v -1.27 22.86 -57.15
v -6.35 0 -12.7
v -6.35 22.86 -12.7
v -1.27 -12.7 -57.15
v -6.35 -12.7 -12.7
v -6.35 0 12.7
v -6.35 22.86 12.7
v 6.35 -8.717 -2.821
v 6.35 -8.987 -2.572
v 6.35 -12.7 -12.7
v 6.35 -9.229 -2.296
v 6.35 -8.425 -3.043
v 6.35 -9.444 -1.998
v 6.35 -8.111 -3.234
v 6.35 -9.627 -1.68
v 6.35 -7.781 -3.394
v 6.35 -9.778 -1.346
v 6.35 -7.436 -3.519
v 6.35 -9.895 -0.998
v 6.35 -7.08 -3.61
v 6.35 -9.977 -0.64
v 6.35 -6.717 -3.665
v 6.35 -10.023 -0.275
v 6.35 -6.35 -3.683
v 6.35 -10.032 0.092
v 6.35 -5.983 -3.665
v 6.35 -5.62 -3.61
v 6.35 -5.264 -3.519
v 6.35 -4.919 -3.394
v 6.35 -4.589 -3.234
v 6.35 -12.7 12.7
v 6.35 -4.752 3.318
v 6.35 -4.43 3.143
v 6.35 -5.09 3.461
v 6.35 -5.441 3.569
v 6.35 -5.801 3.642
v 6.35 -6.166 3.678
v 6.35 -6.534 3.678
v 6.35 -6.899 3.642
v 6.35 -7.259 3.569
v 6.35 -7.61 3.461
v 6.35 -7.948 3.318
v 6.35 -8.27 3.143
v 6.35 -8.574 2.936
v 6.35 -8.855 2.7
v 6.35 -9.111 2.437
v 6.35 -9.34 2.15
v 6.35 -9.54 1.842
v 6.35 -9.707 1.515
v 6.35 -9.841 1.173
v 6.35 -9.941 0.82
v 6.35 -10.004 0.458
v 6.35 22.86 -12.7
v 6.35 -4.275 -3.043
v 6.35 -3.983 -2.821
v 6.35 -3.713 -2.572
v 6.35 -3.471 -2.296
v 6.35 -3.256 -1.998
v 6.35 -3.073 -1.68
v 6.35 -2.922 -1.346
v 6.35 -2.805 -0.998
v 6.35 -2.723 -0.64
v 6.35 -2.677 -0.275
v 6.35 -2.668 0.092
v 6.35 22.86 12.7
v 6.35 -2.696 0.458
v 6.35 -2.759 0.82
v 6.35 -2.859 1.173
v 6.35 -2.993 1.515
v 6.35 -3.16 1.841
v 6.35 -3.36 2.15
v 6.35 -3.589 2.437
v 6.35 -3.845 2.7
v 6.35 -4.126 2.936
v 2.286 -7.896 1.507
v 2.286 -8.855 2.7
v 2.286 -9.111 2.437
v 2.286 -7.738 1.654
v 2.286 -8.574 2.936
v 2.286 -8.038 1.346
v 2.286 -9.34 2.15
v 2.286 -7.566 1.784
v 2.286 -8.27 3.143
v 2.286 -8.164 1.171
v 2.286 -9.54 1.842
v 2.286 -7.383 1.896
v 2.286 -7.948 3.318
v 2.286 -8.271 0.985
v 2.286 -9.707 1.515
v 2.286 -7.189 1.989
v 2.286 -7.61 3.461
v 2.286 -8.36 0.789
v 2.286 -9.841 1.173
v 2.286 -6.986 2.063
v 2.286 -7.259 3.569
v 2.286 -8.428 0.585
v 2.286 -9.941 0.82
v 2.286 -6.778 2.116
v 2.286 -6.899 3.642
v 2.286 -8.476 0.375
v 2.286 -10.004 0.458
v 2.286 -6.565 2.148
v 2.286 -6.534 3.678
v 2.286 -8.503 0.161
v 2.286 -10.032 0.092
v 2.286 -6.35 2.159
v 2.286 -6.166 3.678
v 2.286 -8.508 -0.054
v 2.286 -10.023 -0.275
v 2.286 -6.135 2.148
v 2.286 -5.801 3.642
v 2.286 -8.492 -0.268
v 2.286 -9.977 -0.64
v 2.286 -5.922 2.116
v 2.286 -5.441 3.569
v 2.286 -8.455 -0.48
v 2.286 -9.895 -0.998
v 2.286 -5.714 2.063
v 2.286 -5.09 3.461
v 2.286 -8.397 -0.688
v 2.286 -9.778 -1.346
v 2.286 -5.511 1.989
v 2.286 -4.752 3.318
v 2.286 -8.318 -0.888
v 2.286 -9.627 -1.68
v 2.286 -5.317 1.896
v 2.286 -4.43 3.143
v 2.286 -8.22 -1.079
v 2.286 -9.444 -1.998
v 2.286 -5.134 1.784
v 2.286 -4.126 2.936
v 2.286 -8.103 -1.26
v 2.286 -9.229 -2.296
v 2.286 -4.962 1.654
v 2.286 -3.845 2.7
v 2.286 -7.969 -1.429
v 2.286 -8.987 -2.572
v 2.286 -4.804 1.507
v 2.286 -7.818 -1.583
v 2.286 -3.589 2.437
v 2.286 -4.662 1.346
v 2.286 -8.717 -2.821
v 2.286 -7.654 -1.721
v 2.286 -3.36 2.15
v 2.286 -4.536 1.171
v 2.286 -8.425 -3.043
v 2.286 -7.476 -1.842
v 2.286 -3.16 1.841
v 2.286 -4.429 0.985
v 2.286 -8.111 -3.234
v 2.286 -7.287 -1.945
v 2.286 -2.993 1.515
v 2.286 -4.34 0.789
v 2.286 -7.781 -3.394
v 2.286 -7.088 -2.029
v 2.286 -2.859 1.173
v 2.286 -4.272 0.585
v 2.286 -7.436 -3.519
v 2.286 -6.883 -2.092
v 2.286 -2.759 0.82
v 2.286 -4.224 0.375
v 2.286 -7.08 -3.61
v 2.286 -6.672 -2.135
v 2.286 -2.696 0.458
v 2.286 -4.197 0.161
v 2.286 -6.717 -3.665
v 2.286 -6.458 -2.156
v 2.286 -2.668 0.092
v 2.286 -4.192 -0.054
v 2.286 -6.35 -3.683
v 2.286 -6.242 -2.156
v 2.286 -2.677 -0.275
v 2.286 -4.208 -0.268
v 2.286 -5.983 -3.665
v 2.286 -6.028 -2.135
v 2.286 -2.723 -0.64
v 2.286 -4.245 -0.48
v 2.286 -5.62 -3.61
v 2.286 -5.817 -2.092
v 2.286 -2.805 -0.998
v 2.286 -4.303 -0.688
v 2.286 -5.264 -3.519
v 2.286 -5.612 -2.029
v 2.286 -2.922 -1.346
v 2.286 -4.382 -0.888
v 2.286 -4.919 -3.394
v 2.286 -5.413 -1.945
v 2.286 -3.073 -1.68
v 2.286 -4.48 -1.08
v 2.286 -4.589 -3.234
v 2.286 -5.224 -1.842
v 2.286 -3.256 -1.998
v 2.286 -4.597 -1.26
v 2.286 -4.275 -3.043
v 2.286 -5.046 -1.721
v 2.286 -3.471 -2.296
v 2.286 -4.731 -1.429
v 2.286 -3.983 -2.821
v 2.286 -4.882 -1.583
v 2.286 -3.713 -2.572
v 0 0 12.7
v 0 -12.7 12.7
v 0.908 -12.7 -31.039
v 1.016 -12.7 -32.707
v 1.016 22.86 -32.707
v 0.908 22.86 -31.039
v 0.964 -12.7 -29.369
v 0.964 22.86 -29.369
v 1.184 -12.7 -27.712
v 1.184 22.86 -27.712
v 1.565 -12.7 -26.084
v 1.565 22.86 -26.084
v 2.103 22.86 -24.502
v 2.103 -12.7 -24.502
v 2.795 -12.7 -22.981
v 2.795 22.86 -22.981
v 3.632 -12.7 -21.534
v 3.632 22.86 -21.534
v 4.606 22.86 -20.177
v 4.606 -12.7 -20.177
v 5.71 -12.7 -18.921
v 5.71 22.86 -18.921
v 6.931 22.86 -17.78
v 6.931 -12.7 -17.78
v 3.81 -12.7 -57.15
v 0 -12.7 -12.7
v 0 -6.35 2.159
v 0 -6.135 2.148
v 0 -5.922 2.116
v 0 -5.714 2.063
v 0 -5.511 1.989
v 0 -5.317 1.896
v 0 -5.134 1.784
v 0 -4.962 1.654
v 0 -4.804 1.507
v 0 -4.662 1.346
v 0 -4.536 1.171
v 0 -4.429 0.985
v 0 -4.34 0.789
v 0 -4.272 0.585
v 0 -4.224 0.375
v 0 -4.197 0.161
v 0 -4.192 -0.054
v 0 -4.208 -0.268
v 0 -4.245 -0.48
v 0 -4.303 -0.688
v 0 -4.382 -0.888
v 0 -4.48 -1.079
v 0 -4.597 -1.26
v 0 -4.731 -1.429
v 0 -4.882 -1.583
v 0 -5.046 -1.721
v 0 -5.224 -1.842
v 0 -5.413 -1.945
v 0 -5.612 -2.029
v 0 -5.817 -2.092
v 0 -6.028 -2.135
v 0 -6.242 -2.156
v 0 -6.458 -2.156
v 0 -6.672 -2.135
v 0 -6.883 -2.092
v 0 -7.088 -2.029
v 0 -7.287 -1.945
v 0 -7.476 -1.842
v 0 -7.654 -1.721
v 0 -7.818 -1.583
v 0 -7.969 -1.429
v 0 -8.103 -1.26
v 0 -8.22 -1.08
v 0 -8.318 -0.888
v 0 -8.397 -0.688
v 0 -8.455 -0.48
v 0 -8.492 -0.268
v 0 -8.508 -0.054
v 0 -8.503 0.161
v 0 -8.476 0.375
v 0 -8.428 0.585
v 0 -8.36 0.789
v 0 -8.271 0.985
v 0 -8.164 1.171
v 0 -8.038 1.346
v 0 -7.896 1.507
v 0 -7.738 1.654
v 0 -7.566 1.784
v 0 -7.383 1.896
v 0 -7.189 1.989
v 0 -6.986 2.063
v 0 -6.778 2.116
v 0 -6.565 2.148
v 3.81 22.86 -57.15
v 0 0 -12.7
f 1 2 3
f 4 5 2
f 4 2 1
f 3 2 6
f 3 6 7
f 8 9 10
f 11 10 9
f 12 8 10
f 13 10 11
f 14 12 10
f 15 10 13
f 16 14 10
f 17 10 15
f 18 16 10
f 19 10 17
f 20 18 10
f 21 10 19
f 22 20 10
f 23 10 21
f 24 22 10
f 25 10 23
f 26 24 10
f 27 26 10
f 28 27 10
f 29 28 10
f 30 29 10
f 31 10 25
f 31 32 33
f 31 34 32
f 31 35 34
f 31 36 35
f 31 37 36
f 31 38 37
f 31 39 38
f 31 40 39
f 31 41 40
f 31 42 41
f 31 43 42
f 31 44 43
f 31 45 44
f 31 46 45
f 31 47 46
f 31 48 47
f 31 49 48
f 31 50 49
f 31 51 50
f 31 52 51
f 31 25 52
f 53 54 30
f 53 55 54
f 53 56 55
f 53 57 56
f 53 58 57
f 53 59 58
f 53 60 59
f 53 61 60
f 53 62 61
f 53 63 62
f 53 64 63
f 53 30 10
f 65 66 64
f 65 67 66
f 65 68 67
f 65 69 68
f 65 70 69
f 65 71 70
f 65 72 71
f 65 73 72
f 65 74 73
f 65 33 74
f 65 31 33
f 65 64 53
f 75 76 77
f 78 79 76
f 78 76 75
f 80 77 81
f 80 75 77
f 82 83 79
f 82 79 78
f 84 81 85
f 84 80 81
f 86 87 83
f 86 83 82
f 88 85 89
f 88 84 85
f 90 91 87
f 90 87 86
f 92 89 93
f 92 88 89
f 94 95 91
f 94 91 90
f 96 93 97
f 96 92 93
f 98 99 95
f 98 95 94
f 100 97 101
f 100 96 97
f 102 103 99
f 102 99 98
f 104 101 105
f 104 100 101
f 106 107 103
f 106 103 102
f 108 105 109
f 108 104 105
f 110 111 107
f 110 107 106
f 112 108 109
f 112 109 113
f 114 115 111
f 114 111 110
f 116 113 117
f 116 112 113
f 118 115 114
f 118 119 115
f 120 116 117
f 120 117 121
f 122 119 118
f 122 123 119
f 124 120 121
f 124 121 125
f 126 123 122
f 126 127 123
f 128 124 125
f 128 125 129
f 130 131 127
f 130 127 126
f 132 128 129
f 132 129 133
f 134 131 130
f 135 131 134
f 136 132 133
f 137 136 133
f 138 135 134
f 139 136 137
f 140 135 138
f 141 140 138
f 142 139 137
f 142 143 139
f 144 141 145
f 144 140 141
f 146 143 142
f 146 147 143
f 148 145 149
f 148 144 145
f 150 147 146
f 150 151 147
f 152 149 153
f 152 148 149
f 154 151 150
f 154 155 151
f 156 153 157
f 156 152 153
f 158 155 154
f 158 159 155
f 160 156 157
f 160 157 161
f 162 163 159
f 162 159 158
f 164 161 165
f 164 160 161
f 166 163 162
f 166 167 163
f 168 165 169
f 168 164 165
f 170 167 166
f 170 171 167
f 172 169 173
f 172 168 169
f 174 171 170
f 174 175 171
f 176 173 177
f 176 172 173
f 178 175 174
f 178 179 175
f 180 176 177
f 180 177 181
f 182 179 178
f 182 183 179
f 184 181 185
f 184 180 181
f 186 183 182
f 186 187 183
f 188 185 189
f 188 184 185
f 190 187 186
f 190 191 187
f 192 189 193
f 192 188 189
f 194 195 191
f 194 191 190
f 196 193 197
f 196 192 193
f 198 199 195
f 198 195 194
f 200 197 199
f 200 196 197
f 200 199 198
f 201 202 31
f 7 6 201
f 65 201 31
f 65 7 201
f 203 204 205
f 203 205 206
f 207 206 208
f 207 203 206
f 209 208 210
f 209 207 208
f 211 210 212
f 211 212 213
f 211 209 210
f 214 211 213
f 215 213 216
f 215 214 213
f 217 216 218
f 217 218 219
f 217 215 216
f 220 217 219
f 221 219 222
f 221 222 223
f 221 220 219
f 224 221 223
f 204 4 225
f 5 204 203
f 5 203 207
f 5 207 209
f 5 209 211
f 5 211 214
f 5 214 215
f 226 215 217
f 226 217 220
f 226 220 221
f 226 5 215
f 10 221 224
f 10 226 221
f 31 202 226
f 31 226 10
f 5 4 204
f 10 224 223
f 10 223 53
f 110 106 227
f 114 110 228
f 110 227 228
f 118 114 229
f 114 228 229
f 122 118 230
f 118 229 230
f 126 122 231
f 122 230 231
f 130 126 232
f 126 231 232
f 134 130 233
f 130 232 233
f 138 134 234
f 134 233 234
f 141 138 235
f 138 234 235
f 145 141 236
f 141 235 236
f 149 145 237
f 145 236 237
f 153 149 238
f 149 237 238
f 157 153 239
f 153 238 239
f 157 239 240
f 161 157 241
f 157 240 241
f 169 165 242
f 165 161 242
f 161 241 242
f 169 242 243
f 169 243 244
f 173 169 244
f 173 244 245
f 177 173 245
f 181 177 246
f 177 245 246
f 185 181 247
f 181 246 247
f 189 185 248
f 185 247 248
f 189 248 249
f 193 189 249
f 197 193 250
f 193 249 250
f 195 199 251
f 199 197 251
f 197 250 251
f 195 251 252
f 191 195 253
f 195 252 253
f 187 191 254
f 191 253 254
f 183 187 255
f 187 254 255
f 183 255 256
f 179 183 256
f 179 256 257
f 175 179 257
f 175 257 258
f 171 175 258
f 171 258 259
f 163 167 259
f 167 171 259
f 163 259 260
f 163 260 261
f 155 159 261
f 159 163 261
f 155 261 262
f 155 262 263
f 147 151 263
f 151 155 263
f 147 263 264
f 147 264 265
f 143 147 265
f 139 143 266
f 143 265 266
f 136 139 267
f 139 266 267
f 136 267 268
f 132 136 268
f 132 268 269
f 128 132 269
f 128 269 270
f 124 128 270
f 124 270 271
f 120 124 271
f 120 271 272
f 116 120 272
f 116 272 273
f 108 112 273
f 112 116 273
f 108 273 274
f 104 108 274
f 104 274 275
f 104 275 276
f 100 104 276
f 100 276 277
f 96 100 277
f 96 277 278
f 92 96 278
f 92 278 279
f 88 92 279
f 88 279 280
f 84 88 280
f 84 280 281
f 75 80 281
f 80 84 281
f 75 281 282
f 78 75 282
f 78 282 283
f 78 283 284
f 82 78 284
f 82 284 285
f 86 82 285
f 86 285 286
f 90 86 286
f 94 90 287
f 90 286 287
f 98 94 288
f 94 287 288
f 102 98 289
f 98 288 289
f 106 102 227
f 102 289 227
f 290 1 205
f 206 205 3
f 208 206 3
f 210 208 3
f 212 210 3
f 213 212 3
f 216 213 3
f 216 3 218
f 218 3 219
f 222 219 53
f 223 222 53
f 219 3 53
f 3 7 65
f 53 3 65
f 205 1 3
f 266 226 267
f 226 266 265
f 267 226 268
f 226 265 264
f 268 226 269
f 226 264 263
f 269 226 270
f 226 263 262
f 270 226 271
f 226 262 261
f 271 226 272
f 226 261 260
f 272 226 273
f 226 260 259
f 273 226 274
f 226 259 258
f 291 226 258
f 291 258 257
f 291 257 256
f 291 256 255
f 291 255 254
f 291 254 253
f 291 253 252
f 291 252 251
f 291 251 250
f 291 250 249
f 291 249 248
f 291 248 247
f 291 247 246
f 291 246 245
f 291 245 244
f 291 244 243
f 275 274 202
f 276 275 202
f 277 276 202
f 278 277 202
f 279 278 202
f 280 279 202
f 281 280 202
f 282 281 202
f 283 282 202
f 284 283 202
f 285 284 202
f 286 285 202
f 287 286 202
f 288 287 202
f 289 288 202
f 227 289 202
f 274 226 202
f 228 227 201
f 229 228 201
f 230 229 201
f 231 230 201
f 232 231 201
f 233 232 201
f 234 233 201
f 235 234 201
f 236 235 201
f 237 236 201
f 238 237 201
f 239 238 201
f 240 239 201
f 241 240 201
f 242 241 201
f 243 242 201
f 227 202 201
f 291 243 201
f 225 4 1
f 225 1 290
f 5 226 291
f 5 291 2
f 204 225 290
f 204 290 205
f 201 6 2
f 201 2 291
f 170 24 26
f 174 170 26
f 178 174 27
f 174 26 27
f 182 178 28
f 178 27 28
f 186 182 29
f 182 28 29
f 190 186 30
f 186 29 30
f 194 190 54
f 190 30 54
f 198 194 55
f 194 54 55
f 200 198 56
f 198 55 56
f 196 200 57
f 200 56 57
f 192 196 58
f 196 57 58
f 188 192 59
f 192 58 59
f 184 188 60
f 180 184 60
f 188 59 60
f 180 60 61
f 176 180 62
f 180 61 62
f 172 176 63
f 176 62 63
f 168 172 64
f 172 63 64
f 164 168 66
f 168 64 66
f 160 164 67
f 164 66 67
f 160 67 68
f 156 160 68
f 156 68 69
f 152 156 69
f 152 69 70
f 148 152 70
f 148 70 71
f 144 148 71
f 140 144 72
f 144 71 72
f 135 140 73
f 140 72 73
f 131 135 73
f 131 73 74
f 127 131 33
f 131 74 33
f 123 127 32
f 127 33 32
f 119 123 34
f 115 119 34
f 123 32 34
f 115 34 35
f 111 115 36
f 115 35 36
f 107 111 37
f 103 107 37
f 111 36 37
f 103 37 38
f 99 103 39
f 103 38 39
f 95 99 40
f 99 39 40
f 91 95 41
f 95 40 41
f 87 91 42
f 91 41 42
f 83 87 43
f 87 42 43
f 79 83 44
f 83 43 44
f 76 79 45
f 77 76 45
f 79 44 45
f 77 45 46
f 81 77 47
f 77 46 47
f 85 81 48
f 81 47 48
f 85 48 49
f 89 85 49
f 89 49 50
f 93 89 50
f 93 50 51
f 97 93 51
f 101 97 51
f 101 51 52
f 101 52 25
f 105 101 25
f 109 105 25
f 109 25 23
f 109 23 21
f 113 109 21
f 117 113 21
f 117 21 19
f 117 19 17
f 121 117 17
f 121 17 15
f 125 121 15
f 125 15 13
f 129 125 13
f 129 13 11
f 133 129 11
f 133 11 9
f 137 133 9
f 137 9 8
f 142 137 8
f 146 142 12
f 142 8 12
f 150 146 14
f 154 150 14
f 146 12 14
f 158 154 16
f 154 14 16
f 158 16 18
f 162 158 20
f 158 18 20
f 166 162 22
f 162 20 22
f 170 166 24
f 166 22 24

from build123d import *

# Parameters (mm, degrees)
PROFILE_W               = 12.7
PROFILE_H               = 22.86
PROFILE_W_2             = 6.35
PROFILE_H_2             = 12.7
BOSS_EXTRUDE1_DEPTH     = 12.7
SCREWHOLE_R             = 2.159
CUT_EXTRUDE1_DEPTH      = 7.35
CUT_EXTRUDE1_DEPTH_BACK = 7.35
SKETCH3_R               = 3.683
SKETCH3_R_2             = 2.159
CUT_EXTRUDE2_DEPTH      = 4.064
BOSS_EXTRUDE2_DEPTH     = 35.56


with BuildPart() as part:
    # Profile → Boss-Extrude1 (new body, symmetric)
    with BuildSketch(Plane.XY):
        with Locations((0, 11.43)):
            Rectangle(PROFILE_W, PROFILE_H)
        with Locations((3.175, -6.35)):
            Rectangle(PROFILE_W_2, PROFILE_H_2)
    extrude(amount=BOSS_EXTRUDE1_DEPTH, both=True)

    # ScrewHole → Cut-Extrude1 (cut, two sides)
    with BuildSketch(Plane.ZY) as cut_extrude1_sk:
        with Locations((0, -6.35)):
            Circle(SCREWHOLE_R)
    extrude(amount=CUT_EXTRUDE1_DEPTH, mode=Mode.SUBTRACT)
    extrude(cut_extrude1_sk.sketch, amount=-CUT_EXTRUDE1_DEPTH_BACK, mode=Mode.SUBTRACT)

    # Sketch3 → Cut-Extrude2 (cut)
    with BuildSketch(Plane(origin=(6.35, 0, 0), x_dir=(0, 0, -1), z_dir=(1, 0, 0))):
        with Locations((0, -6.35)):
            Circle(SKETCH3_R)
        with Locations((0, -6.35)):
            Circle(SKETCH3_R_2, mode=Mode.SUBTRACT)
    extrude(amount=-CUT_EXTRUDE2_DEPTH, mode=Mode.SUBTRACT)

    # Sketch5 → Boss-Extrude2 (add)
    with BuildSketch(Plane.XZ.offset(12.7)):
        with BuildLine():
            Line((-1.27, -57.15), (3.81, -57.15))
            Line((3.81, -57.15), (1.016473553, -32.70664359))
            ThreePointArc((1.016473553, -32.70664359), (2.103447964, -24.502378011), (6.930571429, -17.78))
            Line((6.930571429, -17.78), (6.35, -12.7))
            Line((6.35, -12.7), (0, -12.7))
            Line((0, -12.7), (-6.35, -12.7))
            Line((-6.35, -12.7), (-1.27, -57.15))
        make_face()
    extrude(amount=-BOSS_EXTRUDE2_DEPTH)


solid = part.part
